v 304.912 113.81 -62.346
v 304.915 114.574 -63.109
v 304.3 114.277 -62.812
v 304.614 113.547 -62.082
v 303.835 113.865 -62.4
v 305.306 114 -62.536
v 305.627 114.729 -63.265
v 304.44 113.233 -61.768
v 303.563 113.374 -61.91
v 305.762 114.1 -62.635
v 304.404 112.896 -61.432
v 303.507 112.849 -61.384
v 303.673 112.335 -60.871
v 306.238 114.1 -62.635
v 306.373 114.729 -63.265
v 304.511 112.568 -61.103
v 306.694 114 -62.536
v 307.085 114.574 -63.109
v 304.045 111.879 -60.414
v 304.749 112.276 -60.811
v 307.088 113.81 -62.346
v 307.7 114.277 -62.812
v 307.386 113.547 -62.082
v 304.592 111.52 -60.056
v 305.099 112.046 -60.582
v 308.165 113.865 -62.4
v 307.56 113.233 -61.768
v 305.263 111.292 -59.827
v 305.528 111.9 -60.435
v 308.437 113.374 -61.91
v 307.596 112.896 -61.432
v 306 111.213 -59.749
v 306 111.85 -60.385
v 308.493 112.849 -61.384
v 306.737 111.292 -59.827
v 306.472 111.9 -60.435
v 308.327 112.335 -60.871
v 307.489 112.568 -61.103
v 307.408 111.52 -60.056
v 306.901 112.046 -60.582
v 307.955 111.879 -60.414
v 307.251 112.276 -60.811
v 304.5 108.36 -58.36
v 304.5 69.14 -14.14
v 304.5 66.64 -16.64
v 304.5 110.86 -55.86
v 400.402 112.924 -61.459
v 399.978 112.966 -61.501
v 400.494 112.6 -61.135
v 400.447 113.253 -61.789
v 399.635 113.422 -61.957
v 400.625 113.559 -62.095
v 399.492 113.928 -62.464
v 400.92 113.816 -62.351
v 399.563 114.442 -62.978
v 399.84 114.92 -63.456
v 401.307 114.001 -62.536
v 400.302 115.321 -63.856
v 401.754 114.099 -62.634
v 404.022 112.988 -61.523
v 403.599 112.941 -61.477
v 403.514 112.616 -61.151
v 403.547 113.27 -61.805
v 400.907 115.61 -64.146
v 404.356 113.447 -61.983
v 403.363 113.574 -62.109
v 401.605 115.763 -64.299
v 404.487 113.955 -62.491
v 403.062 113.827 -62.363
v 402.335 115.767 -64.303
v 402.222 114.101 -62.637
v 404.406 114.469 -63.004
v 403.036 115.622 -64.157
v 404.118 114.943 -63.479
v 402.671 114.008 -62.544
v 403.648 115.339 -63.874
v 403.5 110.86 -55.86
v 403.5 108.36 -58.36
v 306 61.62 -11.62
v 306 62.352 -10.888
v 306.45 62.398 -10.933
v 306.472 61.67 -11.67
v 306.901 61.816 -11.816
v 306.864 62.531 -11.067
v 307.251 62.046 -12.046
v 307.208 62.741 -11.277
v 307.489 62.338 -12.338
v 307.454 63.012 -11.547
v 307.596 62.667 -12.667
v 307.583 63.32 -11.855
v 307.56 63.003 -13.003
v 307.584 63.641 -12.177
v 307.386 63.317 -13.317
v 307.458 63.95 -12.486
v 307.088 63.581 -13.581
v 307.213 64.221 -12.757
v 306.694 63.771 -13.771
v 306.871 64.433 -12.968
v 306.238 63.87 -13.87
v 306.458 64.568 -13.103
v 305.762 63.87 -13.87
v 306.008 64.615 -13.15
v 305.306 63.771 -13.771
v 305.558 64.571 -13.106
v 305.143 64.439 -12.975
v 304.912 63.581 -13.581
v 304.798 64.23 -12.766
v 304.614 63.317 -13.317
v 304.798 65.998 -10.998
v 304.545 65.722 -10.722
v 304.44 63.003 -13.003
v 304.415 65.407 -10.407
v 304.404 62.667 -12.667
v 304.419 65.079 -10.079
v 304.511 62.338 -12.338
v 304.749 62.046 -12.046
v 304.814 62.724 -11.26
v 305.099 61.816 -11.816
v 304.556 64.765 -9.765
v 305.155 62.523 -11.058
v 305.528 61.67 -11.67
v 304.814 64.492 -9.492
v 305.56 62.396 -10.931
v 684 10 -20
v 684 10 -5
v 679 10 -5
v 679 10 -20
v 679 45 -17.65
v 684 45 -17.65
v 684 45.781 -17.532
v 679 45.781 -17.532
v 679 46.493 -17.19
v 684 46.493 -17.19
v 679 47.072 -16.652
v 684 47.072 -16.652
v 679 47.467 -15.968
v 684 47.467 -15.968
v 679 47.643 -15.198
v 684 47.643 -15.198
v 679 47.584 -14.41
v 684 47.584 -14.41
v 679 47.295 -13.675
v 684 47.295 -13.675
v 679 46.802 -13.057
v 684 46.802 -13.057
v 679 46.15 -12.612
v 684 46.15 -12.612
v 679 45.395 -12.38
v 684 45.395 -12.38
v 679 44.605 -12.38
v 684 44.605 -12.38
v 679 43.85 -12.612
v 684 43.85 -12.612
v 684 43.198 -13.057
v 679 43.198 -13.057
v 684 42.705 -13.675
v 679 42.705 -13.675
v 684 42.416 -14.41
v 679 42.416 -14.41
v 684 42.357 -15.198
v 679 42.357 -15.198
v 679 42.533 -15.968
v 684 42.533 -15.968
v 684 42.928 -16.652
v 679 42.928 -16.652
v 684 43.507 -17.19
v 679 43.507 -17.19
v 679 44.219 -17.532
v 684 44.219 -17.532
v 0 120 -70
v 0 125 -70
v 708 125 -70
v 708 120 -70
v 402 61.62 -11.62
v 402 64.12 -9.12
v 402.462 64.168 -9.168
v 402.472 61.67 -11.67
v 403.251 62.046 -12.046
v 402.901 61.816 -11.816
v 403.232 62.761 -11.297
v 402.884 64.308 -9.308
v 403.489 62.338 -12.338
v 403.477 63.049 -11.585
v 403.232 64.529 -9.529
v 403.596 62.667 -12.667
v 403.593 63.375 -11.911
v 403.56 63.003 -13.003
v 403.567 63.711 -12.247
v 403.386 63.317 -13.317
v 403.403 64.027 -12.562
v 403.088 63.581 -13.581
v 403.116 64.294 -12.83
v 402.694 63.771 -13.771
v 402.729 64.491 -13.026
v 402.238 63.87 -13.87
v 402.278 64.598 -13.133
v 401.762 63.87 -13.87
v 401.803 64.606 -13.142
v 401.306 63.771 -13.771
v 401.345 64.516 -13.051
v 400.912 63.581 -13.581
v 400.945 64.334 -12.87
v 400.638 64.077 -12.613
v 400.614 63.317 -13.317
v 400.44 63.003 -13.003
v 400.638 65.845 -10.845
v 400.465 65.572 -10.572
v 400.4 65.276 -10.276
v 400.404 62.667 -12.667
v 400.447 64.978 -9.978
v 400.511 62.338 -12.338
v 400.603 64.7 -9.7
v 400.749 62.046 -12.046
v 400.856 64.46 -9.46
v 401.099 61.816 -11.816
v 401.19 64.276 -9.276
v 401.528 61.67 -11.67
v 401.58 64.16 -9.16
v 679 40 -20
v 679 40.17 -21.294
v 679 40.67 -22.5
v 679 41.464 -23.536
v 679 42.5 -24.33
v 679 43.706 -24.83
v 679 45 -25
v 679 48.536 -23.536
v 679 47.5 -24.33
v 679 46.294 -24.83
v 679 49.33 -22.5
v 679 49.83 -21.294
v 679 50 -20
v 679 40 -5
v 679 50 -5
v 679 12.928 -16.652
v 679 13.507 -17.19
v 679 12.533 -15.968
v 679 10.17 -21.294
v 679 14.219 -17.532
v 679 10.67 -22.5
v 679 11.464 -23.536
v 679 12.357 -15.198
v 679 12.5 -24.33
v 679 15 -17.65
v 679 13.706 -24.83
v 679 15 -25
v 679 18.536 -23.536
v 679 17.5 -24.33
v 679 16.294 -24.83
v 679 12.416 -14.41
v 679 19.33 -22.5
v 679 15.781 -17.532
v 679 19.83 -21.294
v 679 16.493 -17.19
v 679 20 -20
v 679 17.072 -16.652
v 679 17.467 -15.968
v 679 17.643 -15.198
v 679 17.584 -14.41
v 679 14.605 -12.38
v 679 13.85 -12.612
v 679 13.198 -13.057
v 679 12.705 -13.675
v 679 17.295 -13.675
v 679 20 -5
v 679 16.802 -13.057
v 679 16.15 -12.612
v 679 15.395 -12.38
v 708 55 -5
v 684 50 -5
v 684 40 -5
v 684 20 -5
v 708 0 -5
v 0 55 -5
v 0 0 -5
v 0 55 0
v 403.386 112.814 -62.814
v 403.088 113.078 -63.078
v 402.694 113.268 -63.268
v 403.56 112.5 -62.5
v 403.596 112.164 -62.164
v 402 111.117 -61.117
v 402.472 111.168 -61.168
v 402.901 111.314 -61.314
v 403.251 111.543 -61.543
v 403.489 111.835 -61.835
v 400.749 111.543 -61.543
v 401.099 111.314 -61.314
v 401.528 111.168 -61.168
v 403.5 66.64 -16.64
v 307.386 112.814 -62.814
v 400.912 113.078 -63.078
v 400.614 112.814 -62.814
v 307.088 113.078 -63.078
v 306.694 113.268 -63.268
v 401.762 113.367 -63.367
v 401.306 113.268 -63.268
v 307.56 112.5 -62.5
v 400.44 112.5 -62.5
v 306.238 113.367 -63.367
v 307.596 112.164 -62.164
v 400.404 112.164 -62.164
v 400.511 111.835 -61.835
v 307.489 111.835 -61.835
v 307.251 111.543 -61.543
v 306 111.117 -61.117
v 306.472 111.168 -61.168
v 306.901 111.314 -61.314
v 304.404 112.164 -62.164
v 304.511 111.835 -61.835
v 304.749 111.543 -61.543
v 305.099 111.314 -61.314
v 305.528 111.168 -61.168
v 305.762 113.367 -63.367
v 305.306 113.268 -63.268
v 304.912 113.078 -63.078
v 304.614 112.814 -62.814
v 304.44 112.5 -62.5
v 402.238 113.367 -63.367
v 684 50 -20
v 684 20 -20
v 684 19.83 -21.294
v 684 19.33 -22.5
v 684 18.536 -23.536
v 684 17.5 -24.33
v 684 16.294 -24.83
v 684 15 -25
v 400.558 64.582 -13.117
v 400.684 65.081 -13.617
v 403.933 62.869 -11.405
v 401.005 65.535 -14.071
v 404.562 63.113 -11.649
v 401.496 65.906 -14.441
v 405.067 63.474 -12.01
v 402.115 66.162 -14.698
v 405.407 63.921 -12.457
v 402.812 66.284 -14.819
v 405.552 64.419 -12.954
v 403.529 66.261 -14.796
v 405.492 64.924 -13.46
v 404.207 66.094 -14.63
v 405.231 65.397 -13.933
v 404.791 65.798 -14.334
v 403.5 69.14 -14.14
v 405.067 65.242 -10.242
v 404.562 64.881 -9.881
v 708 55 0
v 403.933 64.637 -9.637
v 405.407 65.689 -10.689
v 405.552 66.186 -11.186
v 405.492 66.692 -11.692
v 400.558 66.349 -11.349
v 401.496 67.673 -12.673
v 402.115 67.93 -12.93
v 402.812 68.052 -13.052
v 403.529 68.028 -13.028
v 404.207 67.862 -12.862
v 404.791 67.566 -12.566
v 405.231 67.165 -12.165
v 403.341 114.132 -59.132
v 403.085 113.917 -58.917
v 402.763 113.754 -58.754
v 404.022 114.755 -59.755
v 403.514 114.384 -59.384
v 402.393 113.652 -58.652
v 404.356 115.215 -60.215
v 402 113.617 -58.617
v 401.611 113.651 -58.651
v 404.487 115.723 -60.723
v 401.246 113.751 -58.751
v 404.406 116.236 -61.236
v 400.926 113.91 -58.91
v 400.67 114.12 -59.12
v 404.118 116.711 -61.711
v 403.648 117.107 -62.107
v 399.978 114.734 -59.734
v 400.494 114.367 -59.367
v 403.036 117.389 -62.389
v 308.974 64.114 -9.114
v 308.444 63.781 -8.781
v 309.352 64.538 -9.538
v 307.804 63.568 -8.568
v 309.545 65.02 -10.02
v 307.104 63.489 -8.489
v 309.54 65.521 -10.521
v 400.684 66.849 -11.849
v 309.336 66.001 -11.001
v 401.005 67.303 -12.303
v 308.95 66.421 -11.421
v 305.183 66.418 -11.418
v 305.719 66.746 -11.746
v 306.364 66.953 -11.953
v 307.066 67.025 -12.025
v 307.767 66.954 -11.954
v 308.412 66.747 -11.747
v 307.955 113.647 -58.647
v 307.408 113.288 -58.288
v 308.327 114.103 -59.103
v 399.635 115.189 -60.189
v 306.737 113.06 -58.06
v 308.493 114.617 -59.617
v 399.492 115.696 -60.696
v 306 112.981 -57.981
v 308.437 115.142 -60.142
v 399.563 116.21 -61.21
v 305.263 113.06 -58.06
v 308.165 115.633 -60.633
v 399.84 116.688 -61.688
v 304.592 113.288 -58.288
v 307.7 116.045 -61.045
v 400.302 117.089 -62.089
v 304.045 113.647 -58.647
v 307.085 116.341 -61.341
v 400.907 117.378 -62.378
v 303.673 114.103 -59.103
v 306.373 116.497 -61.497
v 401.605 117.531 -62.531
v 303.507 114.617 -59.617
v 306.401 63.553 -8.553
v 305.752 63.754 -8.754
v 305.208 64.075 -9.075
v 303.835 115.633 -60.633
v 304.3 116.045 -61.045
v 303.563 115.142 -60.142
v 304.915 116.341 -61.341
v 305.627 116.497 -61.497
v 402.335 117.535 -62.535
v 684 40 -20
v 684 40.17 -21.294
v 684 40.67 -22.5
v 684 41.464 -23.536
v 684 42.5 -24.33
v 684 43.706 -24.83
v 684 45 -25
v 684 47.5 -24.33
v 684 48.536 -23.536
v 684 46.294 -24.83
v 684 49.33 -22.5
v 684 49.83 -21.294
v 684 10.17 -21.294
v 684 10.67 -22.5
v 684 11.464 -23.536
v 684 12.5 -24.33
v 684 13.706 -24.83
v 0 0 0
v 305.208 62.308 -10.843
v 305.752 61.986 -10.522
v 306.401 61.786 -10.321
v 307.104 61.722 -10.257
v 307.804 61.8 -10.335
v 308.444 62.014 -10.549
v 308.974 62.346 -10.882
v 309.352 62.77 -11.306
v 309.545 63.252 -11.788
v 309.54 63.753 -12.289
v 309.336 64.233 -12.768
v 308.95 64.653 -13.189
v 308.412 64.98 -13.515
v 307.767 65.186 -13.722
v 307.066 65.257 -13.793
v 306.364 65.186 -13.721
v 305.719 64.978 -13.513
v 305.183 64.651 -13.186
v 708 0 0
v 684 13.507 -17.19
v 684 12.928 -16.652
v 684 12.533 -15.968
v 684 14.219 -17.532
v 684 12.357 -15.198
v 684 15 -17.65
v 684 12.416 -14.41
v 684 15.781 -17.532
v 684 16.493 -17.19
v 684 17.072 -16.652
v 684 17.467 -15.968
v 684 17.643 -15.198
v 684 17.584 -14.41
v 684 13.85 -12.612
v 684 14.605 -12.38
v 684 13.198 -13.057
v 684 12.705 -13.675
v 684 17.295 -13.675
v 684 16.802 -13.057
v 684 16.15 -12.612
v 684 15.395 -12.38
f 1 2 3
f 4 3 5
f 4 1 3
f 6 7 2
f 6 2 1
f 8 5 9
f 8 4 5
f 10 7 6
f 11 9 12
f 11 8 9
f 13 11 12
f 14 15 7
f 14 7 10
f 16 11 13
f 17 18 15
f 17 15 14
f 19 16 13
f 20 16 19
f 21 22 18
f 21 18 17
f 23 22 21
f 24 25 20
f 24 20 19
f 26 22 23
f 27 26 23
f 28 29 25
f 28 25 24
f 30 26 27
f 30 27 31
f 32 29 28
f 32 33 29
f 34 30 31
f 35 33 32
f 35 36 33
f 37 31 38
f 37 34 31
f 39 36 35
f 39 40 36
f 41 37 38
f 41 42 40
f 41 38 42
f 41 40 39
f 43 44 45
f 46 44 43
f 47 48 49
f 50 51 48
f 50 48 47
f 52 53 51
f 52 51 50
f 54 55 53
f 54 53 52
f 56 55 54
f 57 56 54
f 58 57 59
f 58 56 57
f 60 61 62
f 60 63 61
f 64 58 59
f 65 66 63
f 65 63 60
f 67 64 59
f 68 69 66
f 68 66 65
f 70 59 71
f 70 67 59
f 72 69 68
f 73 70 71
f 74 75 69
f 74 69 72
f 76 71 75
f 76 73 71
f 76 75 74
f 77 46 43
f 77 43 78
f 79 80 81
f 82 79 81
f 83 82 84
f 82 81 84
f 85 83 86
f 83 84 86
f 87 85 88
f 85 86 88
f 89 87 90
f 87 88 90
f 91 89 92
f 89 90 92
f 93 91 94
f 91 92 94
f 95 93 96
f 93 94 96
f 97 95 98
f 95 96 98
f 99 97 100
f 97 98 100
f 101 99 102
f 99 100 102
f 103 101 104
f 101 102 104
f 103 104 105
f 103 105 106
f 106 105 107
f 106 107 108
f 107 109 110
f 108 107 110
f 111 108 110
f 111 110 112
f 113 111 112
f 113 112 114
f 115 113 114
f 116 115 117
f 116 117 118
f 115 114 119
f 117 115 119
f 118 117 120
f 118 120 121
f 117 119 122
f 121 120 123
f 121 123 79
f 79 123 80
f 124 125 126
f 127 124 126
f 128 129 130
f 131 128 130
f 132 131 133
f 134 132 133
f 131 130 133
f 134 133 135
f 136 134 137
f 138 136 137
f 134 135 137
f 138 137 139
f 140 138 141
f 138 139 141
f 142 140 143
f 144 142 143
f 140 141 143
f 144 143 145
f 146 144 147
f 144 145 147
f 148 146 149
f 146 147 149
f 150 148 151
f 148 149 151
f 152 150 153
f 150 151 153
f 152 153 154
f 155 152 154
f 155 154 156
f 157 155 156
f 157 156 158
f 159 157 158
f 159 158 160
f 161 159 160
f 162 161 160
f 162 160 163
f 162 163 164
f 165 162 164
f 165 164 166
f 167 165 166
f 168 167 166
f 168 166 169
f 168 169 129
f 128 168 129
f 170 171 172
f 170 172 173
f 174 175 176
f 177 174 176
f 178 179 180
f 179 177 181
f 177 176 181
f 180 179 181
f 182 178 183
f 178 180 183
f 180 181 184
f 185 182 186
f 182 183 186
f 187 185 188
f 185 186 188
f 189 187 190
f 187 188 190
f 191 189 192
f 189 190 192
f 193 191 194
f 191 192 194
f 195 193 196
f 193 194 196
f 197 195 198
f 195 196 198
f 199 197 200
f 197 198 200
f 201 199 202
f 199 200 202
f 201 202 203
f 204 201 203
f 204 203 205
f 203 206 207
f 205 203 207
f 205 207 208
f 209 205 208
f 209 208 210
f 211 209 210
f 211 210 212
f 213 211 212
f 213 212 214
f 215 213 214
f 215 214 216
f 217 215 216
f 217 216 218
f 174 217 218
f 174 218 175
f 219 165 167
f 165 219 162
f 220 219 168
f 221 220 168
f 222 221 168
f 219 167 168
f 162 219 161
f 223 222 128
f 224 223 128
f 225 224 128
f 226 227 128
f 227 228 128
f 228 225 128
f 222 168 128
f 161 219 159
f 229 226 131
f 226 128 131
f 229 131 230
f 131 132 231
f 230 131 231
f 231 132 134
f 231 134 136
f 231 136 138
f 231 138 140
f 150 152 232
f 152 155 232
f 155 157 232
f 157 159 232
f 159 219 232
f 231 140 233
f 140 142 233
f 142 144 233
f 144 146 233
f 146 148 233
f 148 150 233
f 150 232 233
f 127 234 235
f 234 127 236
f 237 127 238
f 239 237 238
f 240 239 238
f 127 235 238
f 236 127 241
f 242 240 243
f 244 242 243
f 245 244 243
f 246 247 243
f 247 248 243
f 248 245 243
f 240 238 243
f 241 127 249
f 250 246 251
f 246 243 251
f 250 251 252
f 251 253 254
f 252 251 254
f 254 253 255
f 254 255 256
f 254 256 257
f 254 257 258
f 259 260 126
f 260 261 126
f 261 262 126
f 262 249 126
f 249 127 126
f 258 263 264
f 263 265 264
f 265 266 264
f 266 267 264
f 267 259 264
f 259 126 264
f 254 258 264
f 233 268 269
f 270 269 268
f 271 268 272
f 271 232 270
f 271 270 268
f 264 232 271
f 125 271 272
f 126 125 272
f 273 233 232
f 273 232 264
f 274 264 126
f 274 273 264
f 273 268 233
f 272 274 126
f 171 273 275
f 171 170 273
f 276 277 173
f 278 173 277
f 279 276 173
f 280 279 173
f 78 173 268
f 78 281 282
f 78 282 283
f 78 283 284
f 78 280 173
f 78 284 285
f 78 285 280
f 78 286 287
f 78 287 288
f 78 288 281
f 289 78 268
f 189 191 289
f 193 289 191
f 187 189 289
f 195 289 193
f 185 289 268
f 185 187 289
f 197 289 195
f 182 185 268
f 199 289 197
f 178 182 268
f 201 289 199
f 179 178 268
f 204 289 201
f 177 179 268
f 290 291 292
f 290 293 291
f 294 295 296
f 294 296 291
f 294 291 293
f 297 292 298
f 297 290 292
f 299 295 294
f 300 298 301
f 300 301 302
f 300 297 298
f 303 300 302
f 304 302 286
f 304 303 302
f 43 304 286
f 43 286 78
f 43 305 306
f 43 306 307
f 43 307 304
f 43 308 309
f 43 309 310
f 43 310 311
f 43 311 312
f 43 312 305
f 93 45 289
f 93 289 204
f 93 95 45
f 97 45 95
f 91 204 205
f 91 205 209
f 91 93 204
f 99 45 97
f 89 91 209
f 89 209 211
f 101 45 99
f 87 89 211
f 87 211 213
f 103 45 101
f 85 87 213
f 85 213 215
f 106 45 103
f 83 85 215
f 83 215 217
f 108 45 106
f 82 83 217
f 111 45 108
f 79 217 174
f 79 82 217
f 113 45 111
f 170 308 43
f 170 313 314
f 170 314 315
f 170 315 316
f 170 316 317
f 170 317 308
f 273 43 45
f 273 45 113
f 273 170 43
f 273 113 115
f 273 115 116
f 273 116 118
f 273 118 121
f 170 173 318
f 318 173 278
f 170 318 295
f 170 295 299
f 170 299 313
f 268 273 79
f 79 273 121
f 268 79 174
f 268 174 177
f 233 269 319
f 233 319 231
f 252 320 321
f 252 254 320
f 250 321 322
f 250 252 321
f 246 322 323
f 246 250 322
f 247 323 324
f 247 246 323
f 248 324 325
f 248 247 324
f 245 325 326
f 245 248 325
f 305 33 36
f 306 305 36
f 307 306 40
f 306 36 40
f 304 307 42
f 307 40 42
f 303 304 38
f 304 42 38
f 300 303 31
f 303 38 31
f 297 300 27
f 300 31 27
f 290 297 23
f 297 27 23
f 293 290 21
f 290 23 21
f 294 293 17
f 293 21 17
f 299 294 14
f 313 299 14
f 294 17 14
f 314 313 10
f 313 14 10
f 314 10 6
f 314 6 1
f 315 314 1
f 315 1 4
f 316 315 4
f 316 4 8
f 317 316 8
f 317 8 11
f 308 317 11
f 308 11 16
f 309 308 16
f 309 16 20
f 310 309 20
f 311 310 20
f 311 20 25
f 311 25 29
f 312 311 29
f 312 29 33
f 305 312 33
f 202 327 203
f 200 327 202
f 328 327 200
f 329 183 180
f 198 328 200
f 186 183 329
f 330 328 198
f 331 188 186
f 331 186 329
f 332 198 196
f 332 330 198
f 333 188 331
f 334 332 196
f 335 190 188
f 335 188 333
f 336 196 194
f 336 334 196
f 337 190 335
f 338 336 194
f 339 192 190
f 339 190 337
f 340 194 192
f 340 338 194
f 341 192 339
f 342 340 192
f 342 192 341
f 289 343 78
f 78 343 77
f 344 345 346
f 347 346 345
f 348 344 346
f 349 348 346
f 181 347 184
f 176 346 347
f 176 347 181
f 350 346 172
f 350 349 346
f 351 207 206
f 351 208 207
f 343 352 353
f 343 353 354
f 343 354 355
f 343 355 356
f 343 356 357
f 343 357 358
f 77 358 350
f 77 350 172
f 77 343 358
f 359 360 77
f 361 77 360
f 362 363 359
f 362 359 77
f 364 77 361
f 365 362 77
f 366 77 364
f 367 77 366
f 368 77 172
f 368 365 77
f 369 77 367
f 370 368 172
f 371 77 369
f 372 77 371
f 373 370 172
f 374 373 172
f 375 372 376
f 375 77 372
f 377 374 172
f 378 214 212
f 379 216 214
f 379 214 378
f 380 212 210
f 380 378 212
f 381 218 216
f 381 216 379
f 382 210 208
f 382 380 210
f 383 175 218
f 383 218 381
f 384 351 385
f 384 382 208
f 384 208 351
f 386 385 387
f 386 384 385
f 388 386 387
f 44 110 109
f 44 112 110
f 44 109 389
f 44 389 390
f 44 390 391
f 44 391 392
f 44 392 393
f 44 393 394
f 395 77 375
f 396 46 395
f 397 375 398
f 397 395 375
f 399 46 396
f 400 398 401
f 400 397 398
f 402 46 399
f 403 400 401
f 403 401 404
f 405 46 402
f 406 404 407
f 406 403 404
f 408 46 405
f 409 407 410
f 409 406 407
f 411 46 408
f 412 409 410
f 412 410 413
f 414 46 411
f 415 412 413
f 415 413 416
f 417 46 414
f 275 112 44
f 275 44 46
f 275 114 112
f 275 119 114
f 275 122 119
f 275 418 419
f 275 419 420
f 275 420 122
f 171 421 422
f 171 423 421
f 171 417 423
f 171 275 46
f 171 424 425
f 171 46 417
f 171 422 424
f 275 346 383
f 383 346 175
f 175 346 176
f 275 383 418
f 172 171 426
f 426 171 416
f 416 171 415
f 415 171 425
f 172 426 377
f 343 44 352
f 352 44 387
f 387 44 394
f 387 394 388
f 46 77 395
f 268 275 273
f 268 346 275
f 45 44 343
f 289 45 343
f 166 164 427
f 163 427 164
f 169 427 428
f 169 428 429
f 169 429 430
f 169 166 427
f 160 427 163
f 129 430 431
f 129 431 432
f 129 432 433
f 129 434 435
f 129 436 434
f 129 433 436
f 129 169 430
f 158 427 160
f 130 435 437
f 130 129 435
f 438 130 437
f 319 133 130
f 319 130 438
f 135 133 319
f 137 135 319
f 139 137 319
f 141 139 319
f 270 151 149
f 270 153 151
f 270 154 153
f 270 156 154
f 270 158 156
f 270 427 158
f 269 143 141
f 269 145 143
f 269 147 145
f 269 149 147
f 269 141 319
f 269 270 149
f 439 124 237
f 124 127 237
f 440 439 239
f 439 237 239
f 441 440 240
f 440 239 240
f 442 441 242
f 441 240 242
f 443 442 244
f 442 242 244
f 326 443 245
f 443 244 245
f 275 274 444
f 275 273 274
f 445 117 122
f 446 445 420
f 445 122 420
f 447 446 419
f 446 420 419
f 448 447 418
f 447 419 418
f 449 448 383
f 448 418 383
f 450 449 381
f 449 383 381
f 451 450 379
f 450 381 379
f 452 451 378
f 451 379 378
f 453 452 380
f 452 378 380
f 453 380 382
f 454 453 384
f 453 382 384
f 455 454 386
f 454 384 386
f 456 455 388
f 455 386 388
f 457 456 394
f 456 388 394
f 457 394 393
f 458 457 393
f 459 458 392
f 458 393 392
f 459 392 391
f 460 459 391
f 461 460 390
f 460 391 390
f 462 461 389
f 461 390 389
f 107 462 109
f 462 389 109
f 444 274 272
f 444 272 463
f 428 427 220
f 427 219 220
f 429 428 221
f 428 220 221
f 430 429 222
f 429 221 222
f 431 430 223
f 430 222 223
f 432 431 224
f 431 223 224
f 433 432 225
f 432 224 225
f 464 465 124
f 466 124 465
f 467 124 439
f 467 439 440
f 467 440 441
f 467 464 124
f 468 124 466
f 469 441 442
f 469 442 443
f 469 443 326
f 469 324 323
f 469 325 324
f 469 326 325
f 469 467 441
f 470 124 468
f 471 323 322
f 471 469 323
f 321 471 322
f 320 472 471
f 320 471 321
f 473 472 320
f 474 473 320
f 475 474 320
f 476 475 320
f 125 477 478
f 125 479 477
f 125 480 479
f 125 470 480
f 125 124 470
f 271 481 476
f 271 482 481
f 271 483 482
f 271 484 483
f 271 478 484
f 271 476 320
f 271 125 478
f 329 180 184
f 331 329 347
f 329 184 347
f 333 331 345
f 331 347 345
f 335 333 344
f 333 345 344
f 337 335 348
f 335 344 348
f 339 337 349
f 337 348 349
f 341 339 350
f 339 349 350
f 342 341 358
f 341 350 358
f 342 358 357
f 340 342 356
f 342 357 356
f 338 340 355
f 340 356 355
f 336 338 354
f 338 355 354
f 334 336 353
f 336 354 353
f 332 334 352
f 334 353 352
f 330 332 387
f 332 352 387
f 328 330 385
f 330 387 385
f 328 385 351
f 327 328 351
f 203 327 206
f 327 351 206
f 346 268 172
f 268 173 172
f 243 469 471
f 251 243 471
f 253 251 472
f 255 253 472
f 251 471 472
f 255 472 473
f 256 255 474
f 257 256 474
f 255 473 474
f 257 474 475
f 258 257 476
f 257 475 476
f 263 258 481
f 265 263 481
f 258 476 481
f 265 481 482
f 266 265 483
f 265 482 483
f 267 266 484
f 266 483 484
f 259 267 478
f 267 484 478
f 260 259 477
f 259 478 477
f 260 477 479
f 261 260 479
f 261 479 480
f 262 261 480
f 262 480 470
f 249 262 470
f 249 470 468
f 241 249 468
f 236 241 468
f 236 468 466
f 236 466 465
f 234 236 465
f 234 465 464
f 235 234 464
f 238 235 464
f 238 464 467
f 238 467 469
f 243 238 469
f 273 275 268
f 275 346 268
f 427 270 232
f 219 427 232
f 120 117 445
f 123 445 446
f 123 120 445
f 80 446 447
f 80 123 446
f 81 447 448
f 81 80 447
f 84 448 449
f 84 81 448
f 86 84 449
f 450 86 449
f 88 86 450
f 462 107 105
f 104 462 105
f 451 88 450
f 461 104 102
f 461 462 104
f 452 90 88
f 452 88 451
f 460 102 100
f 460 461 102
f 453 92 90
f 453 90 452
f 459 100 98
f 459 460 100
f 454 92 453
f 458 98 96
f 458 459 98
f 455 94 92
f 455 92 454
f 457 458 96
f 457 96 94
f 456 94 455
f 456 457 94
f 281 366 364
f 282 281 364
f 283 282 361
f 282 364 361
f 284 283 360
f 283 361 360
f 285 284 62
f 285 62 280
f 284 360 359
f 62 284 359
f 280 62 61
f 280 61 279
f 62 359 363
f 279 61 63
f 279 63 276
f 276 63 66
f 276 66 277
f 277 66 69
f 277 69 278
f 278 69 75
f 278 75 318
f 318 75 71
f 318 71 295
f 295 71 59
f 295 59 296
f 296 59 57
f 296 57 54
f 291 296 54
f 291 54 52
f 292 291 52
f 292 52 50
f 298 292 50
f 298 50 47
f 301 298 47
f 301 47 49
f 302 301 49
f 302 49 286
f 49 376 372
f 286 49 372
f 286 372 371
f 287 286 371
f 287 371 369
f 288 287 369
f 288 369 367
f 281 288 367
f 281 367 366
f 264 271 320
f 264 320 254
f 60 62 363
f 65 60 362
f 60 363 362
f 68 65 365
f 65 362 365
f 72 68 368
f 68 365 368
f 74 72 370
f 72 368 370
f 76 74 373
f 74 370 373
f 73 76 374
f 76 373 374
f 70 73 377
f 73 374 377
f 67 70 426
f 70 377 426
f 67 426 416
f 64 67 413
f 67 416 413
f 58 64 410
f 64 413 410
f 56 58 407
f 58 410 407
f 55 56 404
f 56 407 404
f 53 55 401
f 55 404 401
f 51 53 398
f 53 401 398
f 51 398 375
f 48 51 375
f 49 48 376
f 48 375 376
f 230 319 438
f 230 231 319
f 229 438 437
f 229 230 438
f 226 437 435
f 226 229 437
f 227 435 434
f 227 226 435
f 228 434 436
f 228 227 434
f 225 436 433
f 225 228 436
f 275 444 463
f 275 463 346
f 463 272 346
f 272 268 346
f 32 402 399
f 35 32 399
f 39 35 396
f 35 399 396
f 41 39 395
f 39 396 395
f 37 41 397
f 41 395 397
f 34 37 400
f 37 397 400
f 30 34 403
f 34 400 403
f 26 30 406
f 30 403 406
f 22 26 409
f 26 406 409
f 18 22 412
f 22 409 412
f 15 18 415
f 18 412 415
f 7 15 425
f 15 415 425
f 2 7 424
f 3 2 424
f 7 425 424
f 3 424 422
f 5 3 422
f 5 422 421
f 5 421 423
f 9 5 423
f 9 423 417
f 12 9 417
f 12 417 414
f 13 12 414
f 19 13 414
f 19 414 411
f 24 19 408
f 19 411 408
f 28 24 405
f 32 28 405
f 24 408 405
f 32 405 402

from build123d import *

# Parameters (mm, degrees)
BOSS_EXTRUDE1_DEPTH = 708
SKETCH2_R           = 1.6
SKETCH2_W           = 99
SKETCH2_H           = 59
CUT_EXTRUDE1_DEPTH  = 708
SKETCH3_W           = 5
SKETCH3_H           = 10
BOSS_EXTRUDE2_DEPTH = 20
FILLET1_R           = 5
SKETCH4_R           = 2.65
CUT_EXTRUDE2_DEPTH  = 10
SKETCH6_R           = 2.5
CUT_EXTRUDE3_DEPTH  = 2.5


with BuildPart() as part:
    # Sketch1 → Boss-Extrude1 (new body)
    with BuildSketch(Plane(origin=(0, 0, 0), x_dir=(0, 0, -1), z_dir=(1, 0, 0))):
        Polygon((0, 0), (0, 55), (70, 125), (70, 120), (5, 55), (5, 0), align=None)
    extrude(amount=BOSS_EXTRUDE1_DEPTH)

    # Sketch2 → Cut-Extrude1 (cut)
    with BuildSketch(Plane(origin=(0, 27.5, 27.5), x_dir=(1, 0, 0), z_dir=(0, 0.7071067811865477, 0.7071067811865475))):
        with Locations(Location((306, 123.388347648, 0), (0, 0, 270))):
            Circle(SKETCH2_R)
        with Locations(Location((402, 123.388347648, 0), (0, 0, 270))):
            Circle(SKETCH2_R)
        with Locations(Location((402, 53.388347648, 0), (0, 0, 270))):
            Circle(SKETCH2_R)
        with Locations(Location((306, 53.388347648, 0), (0, 0, 270))):
            Circle(SKETCH2_R)
        with Locations((354, 88.388347648)):
            Rectangle(SKETCH2_W, SKETCH2_H)
    extrude(amount=-CUT_EXTRUDE1_DEPTH, mode=Mode.SUBTRACT)

    # Sketch3 → Boss-Extrude2 (add)
    with BuildSketch(Plane(origin=(0, 0, -5), x_dir=(-1, 0, 0), z_dir=(0, 0, -1))):
        with Locations((-681.5, 45)):
            Rectangle(SKETCH3_W, SKETCH3_H)
        with Locations((-681.5, 15)):
            Rectangle(SKETCH3_W, SKETCH3_H)
    extrude(amount=BOSS_EXTRUDE2_DEPTH)

    # Fillet1
    fillet1_edges = [part.edges().sort_by_distance(p)[0] for p in [
        (681.5, 10, -25),
        (681.5, 20, -25),
        (681.5, 40, -25),
        (681.5, 50, -25),
    ]]
    fillet(fillet1_edges, radius=FILLET1_R - 0.0001)  # a hair under: the kernel refuses the full size

    # Sketch4 → Cut-Extrude2 (cut)
    with BuildSketch(Plane(origin=(684, 0, 0), x_dir=(0, 0, -1), z_dir=(1, 0, 0))):
        with Locations((15, 45)):
            Circle(SKETCH4_R)
        with Locations((15, 15)):
            Circle(SKETCH4_R)
    extrude(amount=-CUT_EXTRUDE2_DEPTH, mode=Mode.SUBTRACT)

    # Sketch6 → Cut-Extrude3 (cut)
    with BuildSketch(Plane(origin=(0, 27.5, 27.5), x_dir=(1, 0, 0), z_dir=(0, 0.7071067811865477, 0.7071067811865475))):
        with Locations(Location((306, 123.388347648, 0), (0, 0, 270))):
            Circle(SKETCH6_R)
        with Locations((401.98883184, 124.852643374)):
            Circle(SKETCH6_R)
        with Locations((403.056547473, 54.860786824)):
            Circle(SKETCH6_R)
        with Locations((307.067715633, 53.396491098)):
            Circle(SKETCH6_R)
    extrude(amount=-CUT_EXTRUDE3_DEPTH, mode=Mode.SUBTRACT)


with BuildPart() as body_2:
    # Split1: the piece on the far side of the plane
    add(part.part)
    split(bisect_by=Plane(origin=(0, 55, 0), x_dir=(0, 0, -1), z_dir=(0, -1, 0)), keep=Keep.BOTTOM)


with BuildPart() as part_1:
    add(part.part)

    # Split1
    split(bisect_by=Plane(origin=(0, 55, 0), x_dir=(0, 0, -1), z_dir=(0, -1, 0)), keep=Keep.TOP)


solid = Compound([body_2.part, part_1.part])
